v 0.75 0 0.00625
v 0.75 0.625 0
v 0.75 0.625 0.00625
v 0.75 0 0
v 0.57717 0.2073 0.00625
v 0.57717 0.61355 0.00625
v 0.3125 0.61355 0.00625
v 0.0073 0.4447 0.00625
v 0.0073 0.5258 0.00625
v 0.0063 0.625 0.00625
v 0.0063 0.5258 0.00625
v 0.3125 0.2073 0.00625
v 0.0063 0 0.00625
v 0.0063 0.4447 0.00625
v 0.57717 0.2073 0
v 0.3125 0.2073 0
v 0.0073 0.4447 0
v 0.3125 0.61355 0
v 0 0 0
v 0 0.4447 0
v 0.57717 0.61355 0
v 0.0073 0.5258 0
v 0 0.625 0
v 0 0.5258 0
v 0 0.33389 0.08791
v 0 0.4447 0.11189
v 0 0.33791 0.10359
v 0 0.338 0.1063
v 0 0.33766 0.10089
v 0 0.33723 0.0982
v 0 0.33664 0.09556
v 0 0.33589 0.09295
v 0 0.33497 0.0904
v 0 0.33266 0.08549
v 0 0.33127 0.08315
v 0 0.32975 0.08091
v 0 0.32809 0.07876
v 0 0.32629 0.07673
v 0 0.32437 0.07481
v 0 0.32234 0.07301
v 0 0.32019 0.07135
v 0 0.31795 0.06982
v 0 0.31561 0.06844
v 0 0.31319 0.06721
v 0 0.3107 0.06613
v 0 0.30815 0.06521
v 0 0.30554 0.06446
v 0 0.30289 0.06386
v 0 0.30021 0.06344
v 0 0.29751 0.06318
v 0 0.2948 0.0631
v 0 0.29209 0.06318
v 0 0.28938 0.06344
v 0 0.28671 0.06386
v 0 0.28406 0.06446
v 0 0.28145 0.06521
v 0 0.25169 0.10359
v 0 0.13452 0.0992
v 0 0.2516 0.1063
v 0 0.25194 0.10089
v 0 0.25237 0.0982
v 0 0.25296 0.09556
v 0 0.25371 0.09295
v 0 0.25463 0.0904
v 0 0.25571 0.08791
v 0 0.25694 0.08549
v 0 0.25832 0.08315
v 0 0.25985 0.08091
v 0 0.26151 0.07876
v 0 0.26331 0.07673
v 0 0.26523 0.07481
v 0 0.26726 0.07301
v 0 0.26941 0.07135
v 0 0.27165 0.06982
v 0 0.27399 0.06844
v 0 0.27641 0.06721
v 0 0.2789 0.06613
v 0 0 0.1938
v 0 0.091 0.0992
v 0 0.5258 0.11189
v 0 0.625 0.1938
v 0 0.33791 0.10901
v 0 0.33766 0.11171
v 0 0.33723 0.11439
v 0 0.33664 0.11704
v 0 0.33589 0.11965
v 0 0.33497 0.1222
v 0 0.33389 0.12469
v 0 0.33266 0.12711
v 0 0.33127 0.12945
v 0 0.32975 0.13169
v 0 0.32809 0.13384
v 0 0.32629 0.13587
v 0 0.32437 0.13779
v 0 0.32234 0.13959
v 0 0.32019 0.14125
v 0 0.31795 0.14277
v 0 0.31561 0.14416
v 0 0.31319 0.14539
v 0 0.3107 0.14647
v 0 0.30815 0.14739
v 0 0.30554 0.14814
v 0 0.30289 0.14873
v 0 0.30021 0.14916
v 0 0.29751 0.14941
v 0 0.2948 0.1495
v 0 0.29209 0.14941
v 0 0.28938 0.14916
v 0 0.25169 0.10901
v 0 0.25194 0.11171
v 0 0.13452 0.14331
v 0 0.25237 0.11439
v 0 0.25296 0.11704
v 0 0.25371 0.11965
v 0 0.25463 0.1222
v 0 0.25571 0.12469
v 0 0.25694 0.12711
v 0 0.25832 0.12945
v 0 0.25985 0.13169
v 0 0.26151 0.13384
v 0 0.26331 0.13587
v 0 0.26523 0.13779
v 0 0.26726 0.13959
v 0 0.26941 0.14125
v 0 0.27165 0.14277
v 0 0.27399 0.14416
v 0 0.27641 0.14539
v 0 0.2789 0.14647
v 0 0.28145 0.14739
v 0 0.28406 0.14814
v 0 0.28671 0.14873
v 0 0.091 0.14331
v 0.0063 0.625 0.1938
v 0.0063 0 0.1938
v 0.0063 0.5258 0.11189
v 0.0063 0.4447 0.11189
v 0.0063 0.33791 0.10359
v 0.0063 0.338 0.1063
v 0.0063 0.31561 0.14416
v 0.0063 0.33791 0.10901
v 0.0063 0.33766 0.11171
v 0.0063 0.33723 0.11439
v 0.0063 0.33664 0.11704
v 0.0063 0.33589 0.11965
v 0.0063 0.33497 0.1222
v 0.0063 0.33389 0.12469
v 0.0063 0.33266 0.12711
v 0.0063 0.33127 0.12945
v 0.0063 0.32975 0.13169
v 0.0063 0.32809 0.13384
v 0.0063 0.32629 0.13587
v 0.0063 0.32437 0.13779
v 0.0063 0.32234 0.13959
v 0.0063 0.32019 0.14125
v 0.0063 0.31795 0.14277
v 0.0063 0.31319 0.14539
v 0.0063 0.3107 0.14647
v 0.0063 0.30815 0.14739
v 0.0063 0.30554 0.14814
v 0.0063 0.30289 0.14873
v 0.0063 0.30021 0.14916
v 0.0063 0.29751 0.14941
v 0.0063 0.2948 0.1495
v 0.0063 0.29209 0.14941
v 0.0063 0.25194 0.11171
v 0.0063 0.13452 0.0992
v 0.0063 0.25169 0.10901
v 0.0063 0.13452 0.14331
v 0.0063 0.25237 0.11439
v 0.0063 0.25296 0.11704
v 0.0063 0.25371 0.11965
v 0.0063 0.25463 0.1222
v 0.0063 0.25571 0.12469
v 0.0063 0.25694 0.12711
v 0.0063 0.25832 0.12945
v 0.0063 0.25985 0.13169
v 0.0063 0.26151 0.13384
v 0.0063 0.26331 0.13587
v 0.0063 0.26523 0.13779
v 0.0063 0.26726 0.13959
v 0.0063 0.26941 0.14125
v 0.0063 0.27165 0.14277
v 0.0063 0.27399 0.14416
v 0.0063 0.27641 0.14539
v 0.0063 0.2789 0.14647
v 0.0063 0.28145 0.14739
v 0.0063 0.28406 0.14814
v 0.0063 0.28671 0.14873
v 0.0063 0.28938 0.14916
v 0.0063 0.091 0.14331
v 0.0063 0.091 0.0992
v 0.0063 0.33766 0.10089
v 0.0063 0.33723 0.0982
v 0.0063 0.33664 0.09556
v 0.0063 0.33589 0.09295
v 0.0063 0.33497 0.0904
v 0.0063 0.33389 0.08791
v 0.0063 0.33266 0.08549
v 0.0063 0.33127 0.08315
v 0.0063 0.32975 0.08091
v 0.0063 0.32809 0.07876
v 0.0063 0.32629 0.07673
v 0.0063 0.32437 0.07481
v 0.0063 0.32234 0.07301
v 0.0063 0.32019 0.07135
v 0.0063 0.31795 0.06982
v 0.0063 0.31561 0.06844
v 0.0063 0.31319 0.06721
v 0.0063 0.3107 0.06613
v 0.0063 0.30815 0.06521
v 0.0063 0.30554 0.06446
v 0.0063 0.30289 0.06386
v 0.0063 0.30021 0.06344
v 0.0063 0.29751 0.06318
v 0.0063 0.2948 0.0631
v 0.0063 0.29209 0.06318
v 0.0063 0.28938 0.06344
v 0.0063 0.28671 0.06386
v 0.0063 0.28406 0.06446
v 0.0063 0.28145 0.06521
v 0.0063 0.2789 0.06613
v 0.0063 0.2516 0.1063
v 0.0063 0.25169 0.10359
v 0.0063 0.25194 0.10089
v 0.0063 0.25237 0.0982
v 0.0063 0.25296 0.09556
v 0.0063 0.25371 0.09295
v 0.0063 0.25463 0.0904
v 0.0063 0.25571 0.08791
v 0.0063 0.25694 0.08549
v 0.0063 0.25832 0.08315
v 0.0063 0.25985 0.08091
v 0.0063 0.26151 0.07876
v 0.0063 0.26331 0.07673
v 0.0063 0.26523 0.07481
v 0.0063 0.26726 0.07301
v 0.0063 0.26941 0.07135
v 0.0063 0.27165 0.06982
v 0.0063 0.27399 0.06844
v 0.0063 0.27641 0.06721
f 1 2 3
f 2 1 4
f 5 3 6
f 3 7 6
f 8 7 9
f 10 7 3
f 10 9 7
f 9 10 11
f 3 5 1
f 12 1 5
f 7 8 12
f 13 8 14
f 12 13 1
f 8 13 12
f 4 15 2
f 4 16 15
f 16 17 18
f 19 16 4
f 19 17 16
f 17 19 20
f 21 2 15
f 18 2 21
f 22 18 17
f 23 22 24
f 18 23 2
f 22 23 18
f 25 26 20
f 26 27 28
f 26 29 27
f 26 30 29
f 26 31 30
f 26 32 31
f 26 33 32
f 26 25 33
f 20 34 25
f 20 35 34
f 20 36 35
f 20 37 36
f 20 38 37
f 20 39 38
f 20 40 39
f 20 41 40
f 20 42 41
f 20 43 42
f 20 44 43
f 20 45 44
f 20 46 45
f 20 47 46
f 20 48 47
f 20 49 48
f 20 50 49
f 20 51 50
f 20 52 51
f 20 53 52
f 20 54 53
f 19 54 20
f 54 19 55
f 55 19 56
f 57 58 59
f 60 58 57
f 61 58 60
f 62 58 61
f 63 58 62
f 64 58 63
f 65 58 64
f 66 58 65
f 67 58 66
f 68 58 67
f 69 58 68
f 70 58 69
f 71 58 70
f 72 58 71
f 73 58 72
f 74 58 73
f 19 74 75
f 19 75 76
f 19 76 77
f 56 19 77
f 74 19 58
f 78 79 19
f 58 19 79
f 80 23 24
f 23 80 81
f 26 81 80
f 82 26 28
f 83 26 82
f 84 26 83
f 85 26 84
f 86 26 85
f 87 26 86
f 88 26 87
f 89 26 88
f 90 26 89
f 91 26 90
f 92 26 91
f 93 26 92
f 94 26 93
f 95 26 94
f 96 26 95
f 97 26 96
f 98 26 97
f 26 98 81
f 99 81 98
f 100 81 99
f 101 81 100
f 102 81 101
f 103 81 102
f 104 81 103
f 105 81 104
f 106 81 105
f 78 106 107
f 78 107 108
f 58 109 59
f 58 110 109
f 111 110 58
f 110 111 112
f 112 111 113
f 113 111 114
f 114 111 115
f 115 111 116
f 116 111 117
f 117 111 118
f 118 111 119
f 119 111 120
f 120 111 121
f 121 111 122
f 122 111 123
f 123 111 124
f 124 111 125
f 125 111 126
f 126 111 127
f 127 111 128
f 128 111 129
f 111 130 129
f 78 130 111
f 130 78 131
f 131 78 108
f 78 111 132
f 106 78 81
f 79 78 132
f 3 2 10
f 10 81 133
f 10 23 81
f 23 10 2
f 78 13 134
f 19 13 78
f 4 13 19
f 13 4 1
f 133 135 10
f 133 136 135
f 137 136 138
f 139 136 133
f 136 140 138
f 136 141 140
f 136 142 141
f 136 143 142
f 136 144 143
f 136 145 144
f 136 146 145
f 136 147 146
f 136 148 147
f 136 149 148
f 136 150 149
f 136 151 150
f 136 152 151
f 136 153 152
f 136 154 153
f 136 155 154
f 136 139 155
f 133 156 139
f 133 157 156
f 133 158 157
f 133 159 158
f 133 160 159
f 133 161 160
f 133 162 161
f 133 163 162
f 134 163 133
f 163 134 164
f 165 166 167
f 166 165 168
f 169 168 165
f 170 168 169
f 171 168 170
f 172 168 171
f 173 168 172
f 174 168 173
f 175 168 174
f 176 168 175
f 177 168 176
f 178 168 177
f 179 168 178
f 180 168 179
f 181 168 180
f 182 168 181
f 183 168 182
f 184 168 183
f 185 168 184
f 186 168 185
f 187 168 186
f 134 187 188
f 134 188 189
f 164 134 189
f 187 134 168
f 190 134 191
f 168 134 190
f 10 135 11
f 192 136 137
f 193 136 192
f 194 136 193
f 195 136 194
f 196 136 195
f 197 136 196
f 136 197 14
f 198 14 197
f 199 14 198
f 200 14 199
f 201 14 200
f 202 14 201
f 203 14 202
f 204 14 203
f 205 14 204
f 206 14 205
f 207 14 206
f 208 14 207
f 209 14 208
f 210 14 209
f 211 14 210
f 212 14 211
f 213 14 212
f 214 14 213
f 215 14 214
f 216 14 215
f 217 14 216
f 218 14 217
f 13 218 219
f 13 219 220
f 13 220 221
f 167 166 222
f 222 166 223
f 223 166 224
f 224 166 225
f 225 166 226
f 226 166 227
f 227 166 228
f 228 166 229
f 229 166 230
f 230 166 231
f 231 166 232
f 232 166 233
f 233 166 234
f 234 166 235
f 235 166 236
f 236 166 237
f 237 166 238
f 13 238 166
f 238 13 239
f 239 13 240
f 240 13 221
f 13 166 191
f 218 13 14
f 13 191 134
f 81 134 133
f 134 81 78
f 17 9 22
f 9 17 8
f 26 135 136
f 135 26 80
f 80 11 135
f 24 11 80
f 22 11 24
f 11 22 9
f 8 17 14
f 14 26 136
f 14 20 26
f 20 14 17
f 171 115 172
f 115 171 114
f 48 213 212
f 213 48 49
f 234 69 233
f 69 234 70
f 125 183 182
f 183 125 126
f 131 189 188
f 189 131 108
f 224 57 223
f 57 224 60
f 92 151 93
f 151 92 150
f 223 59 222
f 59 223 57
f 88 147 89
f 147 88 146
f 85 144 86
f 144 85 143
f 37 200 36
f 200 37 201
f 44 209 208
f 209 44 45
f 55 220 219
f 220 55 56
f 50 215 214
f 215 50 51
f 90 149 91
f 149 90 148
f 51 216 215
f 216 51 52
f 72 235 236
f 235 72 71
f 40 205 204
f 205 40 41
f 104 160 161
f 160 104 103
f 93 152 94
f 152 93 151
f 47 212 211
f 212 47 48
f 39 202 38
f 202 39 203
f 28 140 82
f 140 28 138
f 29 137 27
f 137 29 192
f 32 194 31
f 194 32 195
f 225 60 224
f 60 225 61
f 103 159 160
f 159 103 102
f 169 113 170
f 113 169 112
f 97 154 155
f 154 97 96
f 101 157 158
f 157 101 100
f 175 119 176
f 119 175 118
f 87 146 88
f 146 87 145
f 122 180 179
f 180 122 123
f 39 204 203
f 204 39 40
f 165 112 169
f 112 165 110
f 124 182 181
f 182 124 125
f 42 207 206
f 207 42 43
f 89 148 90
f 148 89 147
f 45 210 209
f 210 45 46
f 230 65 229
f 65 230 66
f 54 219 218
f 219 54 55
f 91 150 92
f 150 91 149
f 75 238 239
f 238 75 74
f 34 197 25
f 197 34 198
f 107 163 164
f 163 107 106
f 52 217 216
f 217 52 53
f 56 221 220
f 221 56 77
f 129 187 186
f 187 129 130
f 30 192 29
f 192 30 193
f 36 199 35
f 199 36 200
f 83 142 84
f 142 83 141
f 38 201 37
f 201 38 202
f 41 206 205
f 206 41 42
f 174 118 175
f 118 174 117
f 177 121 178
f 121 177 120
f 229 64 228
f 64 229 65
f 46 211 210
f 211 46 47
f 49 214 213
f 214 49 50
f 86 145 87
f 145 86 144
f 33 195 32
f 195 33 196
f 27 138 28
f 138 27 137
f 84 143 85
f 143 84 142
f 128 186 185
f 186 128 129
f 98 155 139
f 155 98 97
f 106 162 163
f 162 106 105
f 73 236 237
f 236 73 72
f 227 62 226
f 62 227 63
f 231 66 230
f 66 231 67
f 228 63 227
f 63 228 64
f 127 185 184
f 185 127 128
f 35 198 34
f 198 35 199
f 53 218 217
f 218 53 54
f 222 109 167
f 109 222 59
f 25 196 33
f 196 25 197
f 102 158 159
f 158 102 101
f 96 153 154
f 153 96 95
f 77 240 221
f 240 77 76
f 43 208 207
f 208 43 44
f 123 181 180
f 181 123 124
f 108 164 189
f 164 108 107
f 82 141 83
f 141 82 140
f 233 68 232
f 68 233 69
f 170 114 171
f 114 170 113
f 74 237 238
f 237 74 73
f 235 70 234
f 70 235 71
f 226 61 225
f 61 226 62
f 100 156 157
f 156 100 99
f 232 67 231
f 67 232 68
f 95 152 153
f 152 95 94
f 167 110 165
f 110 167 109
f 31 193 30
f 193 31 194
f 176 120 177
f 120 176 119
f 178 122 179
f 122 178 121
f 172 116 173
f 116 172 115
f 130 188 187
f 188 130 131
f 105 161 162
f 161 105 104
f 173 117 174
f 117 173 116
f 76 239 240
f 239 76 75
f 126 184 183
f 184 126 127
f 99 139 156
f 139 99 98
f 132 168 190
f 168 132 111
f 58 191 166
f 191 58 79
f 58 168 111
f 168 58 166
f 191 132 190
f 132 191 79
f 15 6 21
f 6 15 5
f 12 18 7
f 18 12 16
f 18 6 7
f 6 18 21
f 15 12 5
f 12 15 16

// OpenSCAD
// Resolution for curved surfaces
$fn = 100;

// Small tolerance to ensure clean through-cuts
eps = 0.001;

// --- Base plate dimensions ---
base_length = 0.75;
base_width  = 0.625;
base_height = 0.00625;      // solid extends upward from base datum (z=0)

// --- Left upright wall dimensions ---
wall_thickness = 0.0063;    // footprint x-dimension
wall_height    = 0.1938;    // total reach from base datum (z=0)

// --- Lower rectangular opening through wall ---
open1_y_span   = 0.081103;
open1_height   = 0.111891;
open1_front_offset = 0.4447;    // distance from front edge (y=0)
open1_z_bottom = 0;             // relative to base underside
open1_reach    = 0.0062;        // nominal through reach

// --- Circular through-hole in wall ---
hole_radius    = 0.0432;
hole_front_offset = 0.2948;     // axis location in y
hole_z_bottom  = 0.0631;
hole_z_top     = 0.1495;
hole_reach     = 0.0625;        // cut depth along x
hole_z_center  = (hole_z_bottom + hole_z_top) / 2;

// --- Smaller rectangular through opening in wall ---
open3_y_span   = 0.043521;
open3_height   = 0.044108;
open3_front_offset = 0.091;
open3_z_bottom = 0.0992;
open3_reach    = 0.0625;

// --- Rectangular through opening in base plate ---
basecut_x_span = 0.264669;
basecut_y_span = 0.40625;
basecut_left_offset  = 0.3125;
basecut_front_offset = 0.2073;
basecut_z_bottom = -0.0562;
basecut_z_top    = 0.0063;

// Main model
difference() {
    union() {
        // Base plate sitting on datum
        cube([base_length, base_width, base_height]);

        // Left wall flush with front/back edges, rising from datum
        cube([wall_thickness, base_width, wall_height]);
    }

    // 1) Lower rectangular opening through wall thickness
    // Starts at wall plane x=0; depth expanded to wall_thickness+eps to ensure
    // a clean through cut (nominal reach 0.0062 is slightly less than wall thickness)
    translate([0, open1_front_offset, open1_z_bottom])
        cube([wall_thickness + eps, open1_y_span, open1_height]);

    // 2) Circular through-hole
    // Axis placed on wall plane (x=0) at specified front offset and vertical center
    translate([0, hole_front_offset, hole_z_center])
        rotate([0, 90, 0])
            cylinder(h = hole_reach, r = hole_radius, center = false);

    // 3) Smaller rectangular through opening
    // Anchored to wall plane x=0 and cutting inward
    translate([0, open3_front_offset, open3_z_bottom])
        cube([open3_reach, open3_y_span, open3_height]);

    // 4) Base plate rectangular through opening
    // Positioned by edge offsets, removal band fully passes through thin plate
    translate([basecut_left_offset, basecut_front_offset, basecut_z_bottom])
        cube([basecut_x_span, basecut_y_span, basecut_z_top - basecut_z_bottom]);
}
